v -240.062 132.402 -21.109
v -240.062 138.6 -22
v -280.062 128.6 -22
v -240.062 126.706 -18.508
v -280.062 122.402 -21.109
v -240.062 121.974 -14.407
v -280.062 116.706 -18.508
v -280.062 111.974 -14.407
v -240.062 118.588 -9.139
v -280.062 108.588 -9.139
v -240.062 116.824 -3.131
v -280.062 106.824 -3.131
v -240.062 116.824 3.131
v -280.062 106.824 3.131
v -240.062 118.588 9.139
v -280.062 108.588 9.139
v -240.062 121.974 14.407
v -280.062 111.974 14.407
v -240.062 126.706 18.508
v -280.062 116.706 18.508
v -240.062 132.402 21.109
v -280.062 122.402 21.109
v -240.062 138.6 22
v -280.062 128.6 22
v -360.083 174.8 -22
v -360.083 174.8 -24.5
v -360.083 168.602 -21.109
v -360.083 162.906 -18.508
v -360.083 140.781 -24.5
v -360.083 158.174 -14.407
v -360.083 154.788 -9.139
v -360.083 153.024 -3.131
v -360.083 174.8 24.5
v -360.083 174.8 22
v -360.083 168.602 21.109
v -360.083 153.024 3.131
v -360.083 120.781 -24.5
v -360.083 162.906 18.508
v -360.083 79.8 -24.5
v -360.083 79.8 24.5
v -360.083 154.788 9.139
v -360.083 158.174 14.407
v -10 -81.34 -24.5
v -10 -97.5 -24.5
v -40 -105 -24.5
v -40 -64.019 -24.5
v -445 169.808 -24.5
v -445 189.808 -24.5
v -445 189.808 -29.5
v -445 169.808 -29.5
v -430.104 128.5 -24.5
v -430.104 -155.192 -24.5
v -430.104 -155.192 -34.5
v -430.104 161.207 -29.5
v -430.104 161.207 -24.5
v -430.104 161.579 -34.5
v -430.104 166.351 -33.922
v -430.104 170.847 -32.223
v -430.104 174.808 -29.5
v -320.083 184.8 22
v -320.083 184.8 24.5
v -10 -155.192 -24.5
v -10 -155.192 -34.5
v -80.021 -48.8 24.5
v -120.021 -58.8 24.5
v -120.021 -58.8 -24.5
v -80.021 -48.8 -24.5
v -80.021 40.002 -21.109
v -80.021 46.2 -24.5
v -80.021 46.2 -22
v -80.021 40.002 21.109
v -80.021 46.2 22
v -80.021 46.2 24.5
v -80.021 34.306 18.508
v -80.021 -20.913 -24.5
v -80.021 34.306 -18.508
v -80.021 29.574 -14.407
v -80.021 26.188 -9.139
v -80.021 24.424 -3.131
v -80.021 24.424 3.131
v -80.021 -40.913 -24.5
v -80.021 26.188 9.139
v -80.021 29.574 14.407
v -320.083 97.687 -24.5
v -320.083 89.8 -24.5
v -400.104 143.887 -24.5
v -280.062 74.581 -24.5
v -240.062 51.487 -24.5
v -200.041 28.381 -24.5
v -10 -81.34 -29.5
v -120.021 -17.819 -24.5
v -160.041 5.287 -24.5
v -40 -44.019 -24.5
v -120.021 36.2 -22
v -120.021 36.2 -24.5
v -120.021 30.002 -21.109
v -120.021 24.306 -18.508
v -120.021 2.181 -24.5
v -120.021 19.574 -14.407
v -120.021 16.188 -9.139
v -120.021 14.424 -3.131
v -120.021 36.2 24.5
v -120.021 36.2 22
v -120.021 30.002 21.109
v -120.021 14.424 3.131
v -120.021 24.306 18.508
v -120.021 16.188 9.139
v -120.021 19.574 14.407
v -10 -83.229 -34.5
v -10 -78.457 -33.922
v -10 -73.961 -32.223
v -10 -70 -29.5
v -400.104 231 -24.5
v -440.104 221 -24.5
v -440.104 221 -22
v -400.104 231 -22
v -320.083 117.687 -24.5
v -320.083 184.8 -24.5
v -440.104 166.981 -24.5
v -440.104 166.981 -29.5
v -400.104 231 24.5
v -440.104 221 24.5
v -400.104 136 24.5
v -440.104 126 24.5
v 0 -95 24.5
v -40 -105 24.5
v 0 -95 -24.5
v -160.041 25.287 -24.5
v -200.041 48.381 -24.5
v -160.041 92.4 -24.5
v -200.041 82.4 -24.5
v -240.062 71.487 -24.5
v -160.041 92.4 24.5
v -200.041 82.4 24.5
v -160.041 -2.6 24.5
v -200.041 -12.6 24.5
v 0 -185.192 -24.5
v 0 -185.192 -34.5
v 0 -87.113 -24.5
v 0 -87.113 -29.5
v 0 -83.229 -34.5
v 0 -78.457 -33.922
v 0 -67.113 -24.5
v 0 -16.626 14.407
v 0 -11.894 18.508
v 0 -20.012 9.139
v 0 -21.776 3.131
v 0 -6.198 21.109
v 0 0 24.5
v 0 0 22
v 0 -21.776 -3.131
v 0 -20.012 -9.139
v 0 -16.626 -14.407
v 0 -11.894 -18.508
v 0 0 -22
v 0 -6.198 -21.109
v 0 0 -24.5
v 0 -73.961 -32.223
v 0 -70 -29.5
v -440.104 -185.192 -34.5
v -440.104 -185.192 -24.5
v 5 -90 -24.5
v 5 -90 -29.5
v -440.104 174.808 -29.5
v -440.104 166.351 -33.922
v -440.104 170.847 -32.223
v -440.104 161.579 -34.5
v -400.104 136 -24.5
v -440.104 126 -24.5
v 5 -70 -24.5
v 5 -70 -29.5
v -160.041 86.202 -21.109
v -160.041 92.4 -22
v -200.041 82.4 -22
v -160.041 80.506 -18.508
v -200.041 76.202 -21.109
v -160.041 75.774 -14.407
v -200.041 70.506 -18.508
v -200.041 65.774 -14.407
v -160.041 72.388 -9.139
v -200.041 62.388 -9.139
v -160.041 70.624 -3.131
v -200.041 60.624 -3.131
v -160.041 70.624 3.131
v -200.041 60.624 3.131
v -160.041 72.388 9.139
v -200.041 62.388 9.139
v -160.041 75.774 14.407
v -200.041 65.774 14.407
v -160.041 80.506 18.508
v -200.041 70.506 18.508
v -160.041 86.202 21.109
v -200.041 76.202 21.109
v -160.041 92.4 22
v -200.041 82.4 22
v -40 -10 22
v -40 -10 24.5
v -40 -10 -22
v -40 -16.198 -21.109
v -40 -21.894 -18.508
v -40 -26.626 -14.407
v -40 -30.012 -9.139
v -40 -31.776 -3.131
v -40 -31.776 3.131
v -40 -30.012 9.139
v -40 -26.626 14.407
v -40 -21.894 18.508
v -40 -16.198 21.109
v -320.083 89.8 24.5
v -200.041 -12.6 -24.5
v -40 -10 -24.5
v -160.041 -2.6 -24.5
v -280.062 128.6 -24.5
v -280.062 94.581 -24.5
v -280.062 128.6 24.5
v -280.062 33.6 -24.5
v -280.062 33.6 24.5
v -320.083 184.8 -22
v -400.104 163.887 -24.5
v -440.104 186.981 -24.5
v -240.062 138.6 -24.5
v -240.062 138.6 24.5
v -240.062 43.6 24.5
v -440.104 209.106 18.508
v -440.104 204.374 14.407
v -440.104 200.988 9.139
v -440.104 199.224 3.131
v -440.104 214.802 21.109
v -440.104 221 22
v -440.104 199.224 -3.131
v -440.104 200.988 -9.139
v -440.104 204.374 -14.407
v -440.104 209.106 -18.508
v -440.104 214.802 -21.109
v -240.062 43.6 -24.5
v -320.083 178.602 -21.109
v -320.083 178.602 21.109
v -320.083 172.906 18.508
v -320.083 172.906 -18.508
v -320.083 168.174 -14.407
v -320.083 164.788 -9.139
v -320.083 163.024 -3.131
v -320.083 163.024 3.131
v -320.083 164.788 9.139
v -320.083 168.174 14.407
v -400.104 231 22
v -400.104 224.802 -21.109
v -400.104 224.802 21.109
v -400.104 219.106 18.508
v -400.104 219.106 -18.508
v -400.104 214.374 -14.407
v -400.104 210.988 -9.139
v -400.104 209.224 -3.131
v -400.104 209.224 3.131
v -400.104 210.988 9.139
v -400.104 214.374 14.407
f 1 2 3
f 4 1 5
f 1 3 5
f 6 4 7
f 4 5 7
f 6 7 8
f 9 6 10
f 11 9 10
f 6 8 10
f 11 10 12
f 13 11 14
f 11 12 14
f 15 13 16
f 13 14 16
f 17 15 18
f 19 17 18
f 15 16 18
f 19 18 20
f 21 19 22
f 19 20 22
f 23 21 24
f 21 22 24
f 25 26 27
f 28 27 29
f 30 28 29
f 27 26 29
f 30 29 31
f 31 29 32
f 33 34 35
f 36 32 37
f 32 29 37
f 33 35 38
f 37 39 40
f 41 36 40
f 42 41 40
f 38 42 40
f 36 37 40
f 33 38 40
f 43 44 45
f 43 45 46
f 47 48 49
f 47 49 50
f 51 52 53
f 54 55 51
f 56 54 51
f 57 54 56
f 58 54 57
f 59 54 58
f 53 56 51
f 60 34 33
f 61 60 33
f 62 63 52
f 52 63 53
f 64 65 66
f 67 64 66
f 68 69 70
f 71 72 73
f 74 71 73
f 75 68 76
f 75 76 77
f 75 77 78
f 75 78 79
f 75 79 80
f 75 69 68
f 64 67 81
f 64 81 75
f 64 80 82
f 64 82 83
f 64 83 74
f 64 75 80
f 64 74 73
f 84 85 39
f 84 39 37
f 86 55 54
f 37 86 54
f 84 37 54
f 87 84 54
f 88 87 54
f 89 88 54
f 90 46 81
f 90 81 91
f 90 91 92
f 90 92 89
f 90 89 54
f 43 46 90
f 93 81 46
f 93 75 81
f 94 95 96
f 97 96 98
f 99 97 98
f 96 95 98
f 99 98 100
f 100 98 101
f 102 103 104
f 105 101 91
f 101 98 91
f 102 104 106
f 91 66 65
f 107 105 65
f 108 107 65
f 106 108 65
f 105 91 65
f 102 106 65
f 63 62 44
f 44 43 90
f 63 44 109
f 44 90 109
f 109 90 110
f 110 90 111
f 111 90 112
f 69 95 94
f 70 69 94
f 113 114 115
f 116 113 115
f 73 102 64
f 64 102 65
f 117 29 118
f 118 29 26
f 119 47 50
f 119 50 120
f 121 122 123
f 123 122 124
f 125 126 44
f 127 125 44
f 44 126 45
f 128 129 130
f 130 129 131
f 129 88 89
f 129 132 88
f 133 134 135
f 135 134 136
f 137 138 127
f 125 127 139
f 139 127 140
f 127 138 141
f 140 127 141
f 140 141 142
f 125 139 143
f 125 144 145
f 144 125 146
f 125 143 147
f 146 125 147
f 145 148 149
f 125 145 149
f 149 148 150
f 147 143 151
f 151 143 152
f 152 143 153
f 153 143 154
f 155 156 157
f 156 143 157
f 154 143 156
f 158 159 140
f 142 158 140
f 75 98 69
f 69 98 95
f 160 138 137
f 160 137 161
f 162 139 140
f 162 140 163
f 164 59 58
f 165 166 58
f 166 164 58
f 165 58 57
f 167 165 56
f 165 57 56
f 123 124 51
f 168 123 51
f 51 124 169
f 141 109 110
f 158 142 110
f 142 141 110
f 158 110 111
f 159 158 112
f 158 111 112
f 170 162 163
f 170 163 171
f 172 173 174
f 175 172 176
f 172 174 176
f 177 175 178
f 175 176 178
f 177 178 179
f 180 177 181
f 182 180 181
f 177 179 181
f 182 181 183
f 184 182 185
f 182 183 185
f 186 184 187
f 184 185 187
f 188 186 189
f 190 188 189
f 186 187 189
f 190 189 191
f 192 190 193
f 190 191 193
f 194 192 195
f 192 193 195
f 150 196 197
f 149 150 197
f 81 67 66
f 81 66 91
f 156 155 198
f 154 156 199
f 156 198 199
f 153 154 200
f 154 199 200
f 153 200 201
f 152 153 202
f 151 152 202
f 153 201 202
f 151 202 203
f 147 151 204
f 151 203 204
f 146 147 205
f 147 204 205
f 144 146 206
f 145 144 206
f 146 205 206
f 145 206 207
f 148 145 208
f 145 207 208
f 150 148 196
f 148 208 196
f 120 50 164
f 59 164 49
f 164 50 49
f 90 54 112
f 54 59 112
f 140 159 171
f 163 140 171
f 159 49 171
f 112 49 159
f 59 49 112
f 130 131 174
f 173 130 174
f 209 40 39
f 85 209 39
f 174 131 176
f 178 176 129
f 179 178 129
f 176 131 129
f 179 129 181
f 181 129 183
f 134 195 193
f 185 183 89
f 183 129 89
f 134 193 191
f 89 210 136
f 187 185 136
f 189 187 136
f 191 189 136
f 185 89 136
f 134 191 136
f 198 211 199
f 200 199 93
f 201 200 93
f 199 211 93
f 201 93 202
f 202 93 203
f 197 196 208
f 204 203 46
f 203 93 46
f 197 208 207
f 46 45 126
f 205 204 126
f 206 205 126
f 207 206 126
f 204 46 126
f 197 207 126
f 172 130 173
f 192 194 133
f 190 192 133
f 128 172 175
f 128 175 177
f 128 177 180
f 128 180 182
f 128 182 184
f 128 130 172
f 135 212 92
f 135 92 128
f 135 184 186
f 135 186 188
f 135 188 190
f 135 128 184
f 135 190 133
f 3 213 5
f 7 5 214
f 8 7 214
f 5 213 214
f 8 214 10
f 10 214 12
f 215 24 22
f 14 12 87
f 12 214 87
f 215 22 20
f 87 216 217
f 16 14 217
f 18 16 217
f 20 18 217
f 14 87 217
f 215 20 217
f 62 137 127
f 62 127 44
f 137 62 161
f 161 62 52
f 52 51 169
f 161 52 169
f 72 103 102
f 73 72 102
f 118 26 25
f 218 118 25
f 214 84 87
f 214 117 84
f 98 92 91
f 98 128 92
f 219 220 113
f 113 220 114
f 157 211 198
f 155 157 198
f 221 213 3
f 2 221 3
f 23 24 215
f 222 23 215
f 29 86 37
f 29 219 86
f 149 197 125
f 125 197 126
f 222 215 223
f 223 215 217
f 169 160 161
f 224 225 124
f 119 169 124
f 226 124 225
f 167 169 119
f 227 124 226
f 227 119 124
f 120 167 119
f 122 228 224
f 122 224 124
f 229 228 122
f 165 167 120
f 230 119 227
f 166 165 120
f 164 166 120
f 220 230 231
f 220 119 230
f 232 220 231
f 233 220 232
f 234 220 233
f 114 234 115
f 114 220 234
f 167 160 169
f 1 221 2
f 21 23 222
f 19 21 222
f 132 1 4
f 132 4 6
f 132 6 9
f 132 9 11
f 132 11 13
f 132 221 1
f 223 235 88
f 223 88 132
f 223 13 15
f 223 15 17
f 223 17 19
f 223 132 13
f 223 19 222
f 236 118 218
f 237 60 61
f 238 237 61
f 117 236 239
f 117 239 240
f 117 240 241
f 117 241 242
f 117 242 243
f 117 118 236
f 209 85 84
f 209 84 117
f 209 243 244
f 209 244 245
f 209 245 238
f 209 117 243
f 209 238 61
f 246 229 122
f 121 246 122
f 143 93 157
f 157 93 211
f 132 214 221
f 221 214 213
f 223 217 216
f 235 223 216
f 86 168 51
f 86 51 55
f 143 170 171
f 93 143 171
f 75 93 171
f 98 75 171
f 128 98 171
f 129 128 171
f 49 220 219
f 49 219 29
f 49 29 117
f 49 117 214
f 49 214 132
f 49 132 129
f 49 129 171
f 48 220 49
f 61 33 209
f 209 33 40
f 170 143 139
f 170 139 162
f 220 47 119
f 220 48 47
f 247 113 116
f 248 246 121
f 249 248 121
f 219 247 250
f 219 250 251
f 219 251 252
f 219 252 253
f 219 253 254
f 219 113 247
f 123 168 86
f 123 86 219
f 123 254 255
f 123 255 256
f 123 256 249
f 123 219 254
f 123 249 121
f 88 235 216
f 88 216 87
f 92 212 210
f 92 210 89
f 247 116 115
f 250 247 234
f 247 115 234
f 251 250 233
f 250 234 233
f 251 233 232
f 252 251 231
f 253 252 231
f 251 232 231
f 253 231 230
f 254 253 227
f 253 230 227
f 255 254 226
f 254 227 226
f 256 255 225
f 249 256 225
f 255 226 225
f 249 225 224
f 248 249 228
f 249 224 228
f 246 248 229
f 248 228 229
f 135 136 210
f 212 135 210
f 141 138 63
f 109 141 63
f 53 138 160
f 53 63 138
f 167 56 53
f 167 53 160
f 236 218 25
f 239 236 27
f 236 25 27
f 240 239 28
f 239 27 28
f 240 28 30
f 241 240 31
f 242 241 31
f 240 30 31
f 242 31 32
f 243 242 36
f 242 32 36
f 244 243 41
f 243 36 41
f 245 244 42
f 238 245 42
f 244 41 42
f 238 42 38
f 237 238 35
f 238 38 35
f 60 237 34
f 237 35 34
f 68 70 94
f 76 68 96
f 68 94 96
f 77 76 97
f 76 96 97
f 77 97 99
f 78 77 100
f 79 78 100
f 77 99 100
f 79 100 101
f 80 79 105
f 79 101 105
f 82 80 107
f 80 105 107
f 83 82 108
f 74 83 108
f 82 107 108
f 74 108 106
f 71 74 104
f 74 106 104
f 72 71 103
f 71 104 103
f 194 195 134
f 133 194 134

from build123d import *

# Parameters (mm, degrees)
BOSS_EXTRUDE1_START = -49
BOSS_EXTRUDE1_DEPTH = 5
LPATTERN1_COUNT     = 6
LPATTERN1_PITCH     = 92.4
BOSS_EXTRUDE2_START = -15
SKETCH8_W           = 10
SKETCH8_H           = 10
BOSS_EXTRUDE2_DEPTH = 330
BOSS_EXTRUDE5_REACH = 540.346
SKETCH11_W          = 10
SKETCH11_H          = 10
FILLET1_R           = 20
SKETCH12_W          = 440.103736548
SKETCH12_H          = 30
BOSS_EXTRUDE6_DEPTH = 10


with BuildPart() as part:
    # Sweep1: sweep along a path in Sketch3
    with BuildLine(Plane.XY) as sweep1_path:
        Line((0, 0), (-40, -10))
    # Sketch2 → Sweep1 (sweep)
    with BuildSketch(Plane(origin=(0, 0, 0), x_dir=(0, 0, -1), z_dir=(1, 0, 0))):
        with BuildLine():
            Line((-24.5, 0), (-22, 0))
            ThreePointArc((-22, 0), (0, -22), (22, 0))
            Line((22, 0), (24.5, 0))
            Line((24.5, 0), (24.5, -95))
            Line((24.5, -95), (-24.5, -95))
            Line((-24.5, -95), (-24.5, 0))
        make_face()
    sweep1 = sweep(path=sweep1_path.line)

    # Sketch7 → Boss-Extrude1 (add)
    with BuildSketch(Plane.XY.offset(24.5).offset(BOSS_EXTRUDE1_START)):
        Polygon((5, -70), (-445, 189.807621135), (-445, 169.807621135), (5, -90), align=None)
    extrude(amount=-BOSS_EXTRUDE1_DEPTH)

    # LPattern1: Sweep1 ×6
    with Locations(*[Vector(-0.86602540378444, 0.4999999999999978, 0) * (i * LPATTERN1_PITCH) for i in range(1, LPATTERN1_COUNT)]):
        add(sweep1)

    # Sketch8 → Boss-Extrude2 (add)
    with BuildSketch(Plane(origin=(0, 189.807621135, 0), x_dir=(1, 0, 0), z_dir=(0, 1, 0)).offset(BOSS_EXTRUDE2_START)):
        with Locations((-435.103736548, 29.5)):
            Rectangle(SKETCH8_W, SKETCH8_H)
    extrude(amount=-BOSS_EXTRUDE2_DEPTH)

    # Boss-Extrude5: up to this face of the body (flat: up to its plane)
    boss_extrude5_end = Plane(part.part.faces().sort_by_distance((-435.103736548, -155.192378865, -29.5))[0])
    # Sketch11 → Boss-Extrude5 (add, up to the picked face)
    with BuildSketch(Plane(origin=(0, -70, 0), x_dir=(1, 0, 0), z_dir=(0, 1, 0)), mode=Mode.PRIVATE) as boss_extrude5_sk1:
        with Locations((-5, 29.5)):
            Rectangle(SKETCH11_W, SKETCH11_H)
    boss_extrude5_tool1 = split(extrude(boss_extrude5_sk1.sketch, amount=-BOSS_EXTRUDE5_REACH, mode=Mode.PRIVATE), bisect_by=boss_extrude5_end, keep=Keep.BOTH, mode=Mode.PRIVATE)
    add(boss_extrude5_tool1.solids().sort_by(Axis((-5, -70, -29.5), (0, -1, 0)))[0])

    # Fillet1
    # the kernel refuses this fillet: 20 mm, written as the material it takes off along each edge
    with BuildSketch(Plane(origin=(-43.071891388, -70, -34.5), x_dir=(0, -1, 0), z_dir=(1, 0, 0))) as fillet1_piece_1:
        with BuildLine():
            CenterArc((13.228756555, -20), FILLET1_R, 90, 41.409622109)
            Line((0, -5), (-0.264575131, -4.7))
            ThreePointArc((-0.264575131, -4.7), (-0.4, -2.5), (-0.4, 0))
            Line((-0.4, 0), (0, 0.4))
            Line((0, 0.4), (13.228756555, 0.4))
            Line((13.228756555, 0.4), (13.228756555, 0))
        make_face()
    extrude(amount=76.143782777, mode=Mode.SUBTRACT)
    with BuildSketch(Plane(origin=(-397.03184516, 174.807621135, -34.5), x_dir=(0, -1, 0), z_dir=(-1, 0, 0))) as fillet1_piece_2:
        with BuildLine():
            CenterArc((13.228756555, 20), FILLET1_R, 228.590377891, 41.409622109)
            Line((0, 5), (-0.264575131, 4.7))
            ThreePointArc((-0.264575131, 4.7), (-0.4, 2.5), (-0.4, 0))
            Line((-0.4, 0), (0, -0.4))
            Line((0, -0.4), (13.228756555, -0.4))
            Line((13.228756555, -0.4), (13.228756555, 0))
        make_face()
    extrude(amount=76.143782777, mode=Mode.SUBTRACT)

    # Sketch12 → Boss-Extrude6 (add)
    with BuildSketch(Plane(origin=(0, 0, -34.5), x_dir=(-1, 0, 0), z_dir=(0, 0, -1))):
        with Locations((220.051868274, -170.192378865)):
            Rectangle(SKETCH12_W, SKETCH12_H)
    extrude(amount=-BOSS_EXTRUDE6_DEPTH)


solid = part.part
